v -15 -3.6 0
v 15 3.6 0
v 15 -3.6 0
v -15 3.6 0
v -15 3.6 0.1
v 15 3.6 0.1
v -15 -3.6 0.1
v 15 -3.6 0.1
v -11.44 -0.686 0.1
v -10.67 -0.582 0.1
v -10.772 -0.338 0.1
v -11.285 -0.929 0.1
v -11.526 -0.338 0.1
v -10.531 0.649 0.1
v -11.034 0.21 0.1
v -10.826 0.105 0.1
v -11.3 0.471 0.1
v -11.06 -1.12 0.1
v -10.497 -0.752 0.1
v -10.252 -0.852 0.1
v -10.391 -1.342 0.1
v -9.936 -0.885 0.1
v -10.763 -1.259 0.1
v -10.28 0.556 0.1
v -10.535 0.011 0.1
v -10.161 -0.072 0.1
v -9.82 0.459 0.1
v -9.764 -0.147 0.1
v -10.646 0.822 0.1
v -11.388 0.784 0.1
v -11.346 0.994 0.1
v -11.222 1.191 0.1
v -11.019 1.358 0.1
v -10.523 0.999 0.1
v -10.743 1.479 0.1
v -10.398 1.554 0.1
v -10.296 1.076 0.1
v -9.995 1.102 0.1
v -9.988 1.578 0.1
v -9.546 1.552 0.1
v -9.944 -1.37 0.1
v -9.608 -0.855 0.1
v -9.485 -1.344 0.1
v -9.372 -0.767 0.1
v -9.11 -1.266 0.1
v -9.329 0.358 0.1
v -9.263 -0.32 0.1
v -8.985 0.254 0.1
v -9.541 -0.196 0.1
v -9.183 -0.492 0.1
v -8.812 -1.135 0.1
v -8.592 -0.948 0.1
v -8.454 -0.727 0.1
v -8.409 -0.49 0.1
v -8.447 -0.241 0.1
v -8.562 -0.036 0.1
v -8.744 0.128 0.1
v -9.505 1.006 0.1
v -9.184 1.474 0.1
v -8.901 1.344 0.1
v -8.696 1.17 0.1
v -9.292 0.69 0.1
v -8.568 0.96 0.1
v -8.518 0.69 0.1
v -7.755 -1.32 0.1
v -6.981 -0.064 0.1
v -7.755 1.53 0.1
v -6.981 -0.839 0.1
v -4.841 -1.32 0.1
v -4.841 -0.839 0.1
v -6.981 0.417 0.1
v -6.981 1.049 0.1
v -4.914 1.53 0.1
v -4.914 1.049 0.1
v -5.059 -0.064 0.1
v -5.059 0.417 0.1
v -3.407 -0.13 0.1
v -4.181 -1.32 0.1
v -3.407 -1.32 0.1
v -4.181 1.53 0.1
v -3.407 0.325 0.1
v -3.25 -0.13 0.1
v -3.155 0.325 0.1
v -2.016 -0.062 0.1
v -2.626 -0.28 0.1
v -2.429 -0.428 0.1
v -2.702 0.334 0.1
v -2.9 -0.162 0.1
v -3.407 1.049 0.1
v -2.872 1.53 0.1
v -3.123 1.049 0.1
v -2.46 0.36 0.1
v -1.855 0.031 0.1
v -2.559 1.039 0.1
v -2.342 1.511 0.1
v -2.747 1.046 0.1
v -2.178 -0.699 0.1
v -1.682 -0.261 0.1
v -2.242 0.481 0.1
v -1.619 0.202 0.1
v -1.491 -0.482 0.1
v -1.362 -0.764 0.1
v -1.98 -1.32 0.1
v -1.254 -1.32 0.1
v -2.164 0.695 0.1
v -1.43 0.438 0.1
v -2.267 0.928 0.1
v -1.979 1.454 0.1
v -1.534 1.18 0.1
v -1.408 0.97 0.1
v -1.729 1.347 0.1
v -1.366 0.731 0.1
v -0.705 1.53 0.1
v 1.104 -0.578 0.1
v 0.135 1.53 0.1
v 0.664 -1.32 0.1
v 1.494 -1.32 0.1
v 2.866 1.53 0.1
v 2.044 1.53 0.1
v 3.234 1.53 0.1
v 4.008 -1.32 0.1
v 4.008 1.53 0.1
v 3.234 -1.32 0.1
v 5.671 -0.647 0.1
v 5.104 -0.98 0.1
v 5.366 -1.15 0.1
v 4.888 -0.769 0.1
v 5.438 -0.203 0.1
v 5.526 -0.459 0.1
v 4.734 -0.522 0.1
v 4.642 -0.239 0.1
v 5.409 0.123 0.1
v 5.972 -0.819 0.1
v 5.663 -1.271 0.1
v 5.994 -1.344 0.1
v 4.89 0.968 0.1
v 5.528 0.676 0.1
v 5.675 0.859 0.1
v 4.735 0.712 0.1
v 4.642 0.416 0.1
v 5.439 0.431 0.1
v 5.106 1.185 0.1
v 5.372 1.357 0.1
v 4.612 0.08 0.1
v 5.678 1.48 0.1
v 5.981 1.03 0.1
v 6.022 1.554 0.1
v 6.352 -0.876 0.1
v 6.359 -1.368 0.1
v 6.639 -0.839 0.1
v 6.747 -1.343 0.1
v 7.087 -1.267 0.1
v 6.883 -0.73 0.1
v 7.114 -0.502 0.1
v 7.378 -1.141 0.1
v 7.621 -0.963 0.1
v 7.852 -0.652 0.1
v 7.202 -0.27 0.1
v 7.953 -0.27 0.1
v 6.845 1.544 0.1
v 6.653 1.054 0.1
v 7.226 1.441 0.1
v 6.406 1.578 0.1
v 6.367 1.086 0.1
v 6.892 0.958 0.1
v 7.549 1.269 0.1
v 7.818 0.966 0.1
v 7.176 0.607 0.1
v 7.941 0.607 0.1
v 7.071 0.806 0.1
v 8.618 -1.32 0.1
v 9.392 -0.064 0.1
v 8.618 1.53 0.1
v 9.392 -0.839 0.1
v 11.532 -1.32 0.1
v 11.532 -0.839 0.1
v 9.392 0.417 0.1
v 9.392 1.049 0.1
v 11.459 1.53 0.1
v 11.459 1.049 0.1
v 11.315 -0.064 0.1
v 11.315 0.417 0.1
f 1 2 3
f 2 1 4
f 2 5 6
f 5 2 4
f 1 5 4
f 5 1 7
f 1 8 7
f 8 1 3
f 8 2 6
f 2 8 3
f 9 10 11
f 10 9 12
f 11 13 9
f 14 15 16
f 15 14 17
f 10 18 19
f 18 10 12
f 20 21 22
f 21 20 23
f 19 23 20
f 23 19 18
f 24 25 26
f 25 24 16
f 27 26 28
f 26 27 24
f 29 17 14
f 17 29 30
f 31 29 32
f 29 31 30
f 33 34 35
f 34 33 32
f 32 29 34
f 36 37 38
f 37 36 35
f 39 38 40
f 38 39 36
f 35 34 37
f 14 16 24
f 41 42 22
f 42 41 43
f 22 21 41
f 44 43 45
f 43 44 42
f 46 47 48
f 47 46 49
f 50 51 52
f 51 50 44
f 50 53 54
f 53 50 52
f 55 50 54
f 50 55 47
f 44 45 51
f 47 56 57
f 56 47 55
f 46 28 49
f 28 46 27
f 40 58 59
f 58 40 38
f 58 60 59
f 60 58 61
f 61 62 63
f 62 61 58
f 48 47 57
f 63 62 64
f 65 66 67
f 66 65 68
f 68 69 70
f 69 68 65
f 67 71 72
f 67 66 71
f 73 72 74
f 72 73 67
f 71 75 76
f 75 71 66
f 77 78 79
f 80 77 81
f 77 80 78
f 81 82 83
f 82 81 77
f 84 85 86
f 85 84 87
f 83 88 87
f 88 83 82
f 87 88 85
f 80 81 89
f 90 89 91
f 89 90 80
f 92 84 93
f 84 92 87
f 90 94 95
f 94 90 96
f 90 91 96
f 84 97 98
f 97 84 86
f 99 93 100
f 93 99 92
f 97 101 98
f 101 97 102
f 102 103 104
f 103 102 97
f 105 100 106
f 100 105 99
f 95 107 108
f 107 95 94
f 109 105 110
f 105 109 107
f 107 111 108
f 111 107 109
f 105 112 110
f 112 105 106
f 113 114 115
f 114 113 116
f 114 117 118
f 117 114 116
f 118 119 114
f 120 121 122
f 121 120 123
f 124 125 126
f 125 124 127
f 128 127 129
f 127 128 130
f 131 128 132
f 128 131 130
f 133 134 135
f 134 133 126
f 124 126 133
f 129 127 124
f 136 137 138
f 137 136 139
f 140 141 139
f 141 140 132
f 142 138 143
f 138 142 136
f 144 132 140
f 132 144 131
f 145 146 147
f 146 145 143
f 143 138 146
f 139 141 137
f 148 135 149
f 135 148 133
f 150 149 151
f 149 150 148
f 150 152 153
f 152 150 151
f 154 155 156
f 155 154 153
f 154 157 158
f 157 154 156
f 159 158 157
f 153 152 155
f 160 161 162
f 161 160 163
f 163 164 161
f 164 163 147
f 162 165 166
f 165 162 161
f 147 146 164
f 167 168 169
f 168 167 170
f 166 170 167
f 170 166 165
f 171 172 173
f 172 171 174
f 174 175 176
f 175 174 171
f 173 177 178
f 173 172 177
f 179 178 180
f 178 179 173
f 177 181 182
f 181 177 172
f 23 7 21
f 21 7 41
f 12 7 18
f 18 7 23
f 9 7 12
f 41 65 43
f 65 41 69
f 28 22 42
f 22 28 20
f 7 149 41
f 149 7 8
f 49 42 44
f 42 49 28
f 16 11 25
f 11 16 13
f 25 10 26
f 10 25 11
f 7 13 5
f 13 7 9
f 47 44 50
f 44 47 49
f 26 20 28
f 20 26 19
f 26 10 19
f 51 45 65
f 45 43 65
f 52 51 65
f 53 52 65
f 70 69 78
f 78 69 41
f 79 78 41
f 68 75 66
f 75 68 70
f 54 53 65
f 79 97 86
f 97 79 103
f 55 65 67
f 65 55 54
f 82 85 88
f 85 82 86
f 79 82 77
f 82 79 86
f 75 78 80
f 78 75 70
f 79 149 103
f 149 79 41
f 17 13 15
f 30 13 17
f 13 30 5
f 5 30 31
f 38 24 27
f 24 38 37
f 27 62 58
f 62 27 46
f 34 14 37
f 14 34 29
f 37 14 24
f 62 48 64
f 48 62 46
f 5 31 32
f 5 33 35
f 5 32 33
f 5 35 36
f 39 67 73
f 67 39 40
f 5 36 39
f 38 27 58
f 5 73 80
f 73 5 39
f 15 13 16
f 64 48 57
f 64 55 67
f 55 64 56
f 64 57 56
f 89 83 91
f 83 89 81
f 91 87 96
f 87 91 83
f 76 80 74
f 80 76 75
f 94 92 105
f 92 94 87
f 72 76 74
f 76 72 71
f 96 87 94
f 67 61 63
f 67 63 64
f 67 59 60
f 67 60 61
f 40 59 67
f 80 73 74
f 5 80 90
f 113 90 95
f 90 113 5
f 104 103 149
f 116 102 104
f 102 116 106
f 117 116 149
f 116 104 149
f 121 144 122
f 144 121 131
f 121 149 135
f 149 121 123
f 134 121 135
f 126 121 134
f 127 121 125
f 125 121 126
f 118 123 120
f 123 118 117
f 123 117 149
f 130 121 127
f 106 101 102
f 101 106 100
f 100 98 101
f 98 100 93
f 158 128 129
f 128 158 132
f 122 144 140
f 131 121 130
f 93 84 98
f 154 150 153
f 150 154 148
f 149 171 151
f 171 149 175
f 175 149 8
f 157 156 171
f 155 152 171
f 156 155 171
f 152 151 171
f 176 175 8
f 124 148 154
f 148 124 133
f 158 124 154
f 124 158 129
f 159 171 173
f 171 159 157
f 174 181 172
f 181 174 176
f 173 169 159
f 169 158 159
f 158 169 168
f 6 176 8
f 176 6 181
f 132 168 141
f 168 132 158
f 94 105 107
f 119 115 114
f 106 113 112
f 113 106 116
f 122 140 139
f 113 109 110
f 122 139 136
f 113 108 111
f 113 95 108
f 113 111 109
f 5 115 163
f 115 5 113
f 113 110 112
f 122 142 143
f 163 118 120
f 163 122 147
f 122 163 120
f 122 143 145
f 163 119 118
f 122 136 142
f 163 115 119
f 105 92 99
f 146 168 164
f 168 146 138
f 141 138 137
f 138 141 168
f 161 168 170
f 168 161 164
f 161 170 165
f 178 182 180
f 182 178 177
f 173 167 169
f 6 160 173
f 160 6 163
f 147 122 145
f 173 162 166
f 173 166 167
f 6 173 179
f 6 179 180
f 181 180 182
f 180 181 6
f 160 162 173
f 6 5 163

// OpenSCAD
// file: ../p/box5-12.scad
use <../lib.scad>
function ldraw_lib__box5_12() = [
// 0 Box with 5 Faces without Any Edges
// 0 Name: box5-12.dat
// 0 Author: Chris Dee [cwdee]
// 0 !LDRAW_ORG Primitive UPDATE 2009-02
// 0 !LICENSE Licensed under CC BY 2.0 and CC BY 4.0 : see CAreadme.txt
// 
// 0 BFC CERTIFY CCW
  [0,"BFC","CERTIFY"],
  [0,"BFC","CCW"],
// 
// 0 !HISTORY 2009-09-03 [PTadmin] Official Update 2009-02
// 
// 
// 4 16 1 1 1 1 1 -1 -1 1 -1 -1 1 1
  [4,16,1,1,1,1,1,-1,-1,1,-1,-1,1,1],
// 4 16 -1 0 1 1 0 1 1 1 1 -1 1 1
  [4,16,-1,0,1,1,0,1,1,1,1,-1,1,1],
// 4 16 -1 0 -1 -1 0 1 -1 1 1 -1 1 -1
  [4,16,-1,0,-1,-1,0,1,-1,1,1,-1,1,-1],
// 4 16 1 0 -1 -1 0 -1 -1 1 -1 1 1 -1
  [4,16,1,0,-1,-1,0,-1,-1,1,-1,1,1,-1],
// 4 16 1 0 1 1 0 -1 1 1 -1 1 1 1
  [4,16,1,0,1,1,0,-1,1,1,-1,1,1,1],
// 0
];
module ldraw_lib__box5_12(step=0, col=false, unit=2/5, alt=false, line=0.2, solid=!$preview)
    makepoly(ldraw_lib__box5_12(), step=step, col=col, unit=unit, alt=alt, line=line, solid=solid);
ldraw_lib__box5_12(line=0.2);
// main file
use <../lib.scad>
use <../p/box5-12.scad>
function ldraw_lib__190435b() = [
// 0 Sticker  0.9 x  3.7 with "SERVICE"
// 0 Name: 190435b.dat
// 0 Author: J.C. Tchang [tchang]
// 0 !LDRAW_ORG Part UPDATE 2013-02
// 0 !LICENSE Licensed under CC BY 2.0 and CC BY 4.0 : see CAreadme.txt
// 
// 0 BFC CERTIFY CCW
  [0,"BFC","CERTIFY"],
  [0,"BFC","CCW"],
// 
// 0 !KEYWORDS set 646
// 
// 0 !HISTORY 2013-12-23 [PTadmin] Official Update 2013-02
// 
// 
// 1 16 0 -0.25 0 37.5 0 0 0 0.25 0 0 0 9 box5-12.dat
  [1,16,0,-0.25,0,37.5,0,0,0,0.25,0,0,0,9, ldraw_lib__box5_12()],
// 0 //
// 4 15 -26.674 -0.25 -1.456 -26.931 -0.25 -0.844 -28.601 -0.25 -1.715 -28.213 -0.25 -2.322
  [4,15,-26.674,-0.25,-1.456,-26.931,-0.25,-0.844,-28.601,-0.25,-1.715,-28.213,-0.25,-2.322],
// 3 15 -26.931 -0.25 -0.844 -28.815 -0.25 -0.844 -28.601 -0.25 -1.715
  [3,15,-26.931,-0.25,-0.844,-28.815,-0.25,-0.844,-28.601,-0.25,-1.715],
// 4 15 -27.586 -0.25 0.525 -27.064 -0.25 0.262 -26.327 -0.25 1.623 -28.249 -0.25 1.178
  [4,15,-27.586,-0.25,0.525,-27.064,-0.25,0.262,-26.327,-0.25,1.623,-28.249,-0.25,1.178],
// 4 15 -28.213 -0.25 -2.322 -27.651 -0.25 -2.801 -26.242 -0.25 -1.881 -26.674 -0.25 -1.456
  [4,15,-28.213,-0.25,-2.322,-27.651,-0.25,-2.801,-26.242,-0.25,-1.881,-26.674,-0.25,-1.456],
// 4 15 -25.631 -0.25 -2.129 -26.908 -0.25 -3.148 -25.977 -0.25 -3.356 -24.839 -0.25 -2.212
  [4,15,-25.631,-0.25,-2.129,-26.908,-0.25,-3.148,-25.977,-0.25,-3.356,-24.839,-0.25,-2.212],
// 4 15 -26.908 -0.25 -3.148 -25.631 -0.25 -2.129 -26.242 -0.25 -1.881 -27.651 -0.25 -2.801
  [4,15,-26.908,-0.25,-3.148,-25.631,-0.25,-2.129,-26.242,-0.25,-1.881,-27.651,-0.25,-2.801],
// 4 15 -25.7 -0.25 1.39 -27.064 -0.25 0.262 -26.337 -0.25 0.027 -25.402 -0.25 -0.179
  [4,15,-25.7,-0.25,1.39,-27.064,-0.25,0.262,-26.337,-0.25,0.027,-25.402,-0.25,-0.179],
// 4 15 -24.55 -0.25 1.147 -25.7 -0.25 1.39 -25.402 -0.25 -0.179 -24.41 -0.25 -0.368
  [4,15,-24.55,-0.25,1.147,-25.7,-0.25,1.39,-25.402,-0.25,-0.179,-24.41,-0.25,-0.368],
// 4 15 -26.615 -0.25 2.055 -28.469 -0.25 1.959 -28.249 -0.25 1.178 -26.327 -0.25 1.623
  [4,15,-26.615,-0.25,2.055,-28.469,-0.25,1.959,-28.249,-0.25,1.178,-26.327,-0.25,1.623],
// 4 15 -28.365 -0.25 2.485 -28.469 -0.25 1.959 -26.615 -0.25 2.055 -28.054 -0.25 2.977
  [4,15,-28.365,-0.25,2.485,-28.469,-0.25,1.959,-26.615,-0.25,2.055,-28.054,-0.25,2.977],
// 4 15 -27.547 -0.25 3.394 -28.054 -0.25 2.977 -26.308 -0.25 2.497 -26.857 -0.25 3.698
  [4,15,-27.547,-0.25,3.394,-28.054,-0.25,2.977,-26.308,-0.25,2.497,-26.857,-0.25,3.698],
// 3 15 -28.054 -0.25 2.977 -26.615 -0.25 2.055 -26.308 -0.25 2.497
  [3,15,-28.054,-0.25,2.977,-26.615,-0.25,2.055,-26.308,-0.25,2.497],
// 4 15 -25.739 -0.25 2.69 -24.987 -0.25 2.754 -25.994 -0.25 3.884 -26.857 -0.25 3.698
  [4,15,-25.739,-0.25,2.69,-24.987,-0.25,2.754,-25.994,-0.25,3.884,-26.857,-0.25,3.698],
// 4 15 -24.97 -0.25 3.946 -25.994 -0.25 3.884 -24.987 -0.25 2.754 -23.865 -0.25 3.881
  [4,15,-24.97,-0.25,3.946,-25.994,-0.25,3.884,-24.987,-0.25,2.754,-23.865,-0.25,3.881],
// 3 15 -26.857 -0.25 3.698 -26.308 -0.25 2.497 -25.739 -0.25 2.69
  [3,15,-26.857,-0.25,3.698,-26.308,-0.25,2.497,-25.739,-0.25,2.69],
// 3 15 -26.327 -0.25 1.623 -27.064 -0.25 0.262 -25.7 -0.25 1.39
  [3,15,-26.327,-0.25,1.623,-27.064,-0.25,0.262,-25.7,-0.25,1.39],
// 4 15 -24.839 -0.25 -2.212 -24.859 -0.25 -3.426 -23.713 -0.25 -3.361 -24.02 -0.25 -2.138
  [4,15,-24.839,-0.25,-2.212,-24.859,-0.25,-3.426,-23.713,-0.25,-3.361,-24.02,-0.25,-2.138],
// 3 15 -24.839 -0.25 -2.212 -25.977 -0.25 -3.356 -24.859 -0.25 -3.426
  [3,15,-24.839,-0.25,-2.212,-25.977,-0.25,-3.356,-24.859,-0.25,-3.426],
// 4 15 -22.774 -0.25 -3.166 -23.431 -0.25 -1.917 -24.02 -0.25 -2.138 -23.713 -0.25 -3.361
  [4,15,-22.774,-0.25,-3.166,-23.431,-0.25,-1.917,-24.02,-0.25,-2.138,-23.713,-0.25,-3.361],
// 4 15 -23.853 -0.25 -0.49 -23.157 -0.25 -0.799 -22.462 -0.25 0.635 -23.322 -0.25 0.895
  [4,15,-23.853,-0.25,-0.49,-23.157,-0.25,-0.799,-22.462,-0.25,0.635,-23.322,-0.25,0.895],
// 4 15 -23.431 -0.25 -1.917 -22.031 -0.25 -2.837 -21.479 -0.25 -2.371 -22.957 -0.25 -1.229
  [4,15,-23.431,-0.25,-1.917,-22.031,-0.25,-2.837,-21.479,-0.25,-2.371,-22.957,-0.25,-1.229],
// 4 15 -21.136 -0.25 -1.817 -21.022 -0.25 -1.224 -22.957 -0.25 -1.229 -21.479 -0.25 -2.371
  [4,15,-21.136,-0.25,-1.817,-21.022,-0.25,-1.224,-22.957,-0.25,-1.229,-21.479,-0.25,-2.371],
// 4 15 -22.957 -0.25 -1.229 -21.022 -0.25 -1.224 -21.117 -0.25 -0.603 -23.157 -0.25 -0.799
  [4,15,-22.957,-0.25,-1.229,-21.022,-0.25,-1.224,-21.117,-0.25,-0.603,-23.157,-0.25,-0.799],
// 3 15 -23.431 -0.25 -1.917 -22.774 -0.25 -3.166 -22.031 -0.25 -2.837
  [3,15,-23.431,-0.25,-1.917,-22.774,-0.25,-3.166,-22.031,-0.25,-2.837],
// 4 15 -23.157 -0.25 -0.799 -21.117 -0.25 -0.603 -21.404 -0.25 -0.089 -21.859 -0.25 0.321
  [4,15,-23.157,-0.25,-0.799,-21.117,-0.25,-0.603,-21.404,-0.25,-0.089,-21.859,-0.25,0.321],
// 4 15 -23.322 -0.25 0.895 -24.55 -0.25 1.147 -24.41 -0.25 -0.368 -23.853 -0.25 -0.49
  [4,15,-23.322,-0.25,0.895,-24.55,-0.25,1.147,-24.41,-0.25,-0.368,-23.853,-0.25,-0.49],
// 4 15 -23.762 -0.25 2.514 -22.959 -0.25 3.685 -23.865 -0.25 3.881 -24.987 -0.25 2.754
  [4,15,-23.762,-0.25,2.514,-22.959,-0.25,3.685,-23.865,-0.25,3.881,-24.987,-0.25,2.754],
// 4 15 -22.252 -0.25 3.359 -22.959 -0.25 3.685 -23.762 -0.25 2.514 -21.74 -0.25 2.924
  [4,15,-22.252,-0.25,3.359,-22.959,-0.25,3.685,-23.762,-0.25,2.514,-21.74,-0.25,2.924],
// 4 15 -21.74 -0.25 2.924 -23.762 -0.25 2.514 -23.229 -0.25 1.726 -21.42 -0.25 2.401
  [4,15,-21.74,-0.25,2.924,-23.762,-0.25,2.514,-23.229,-0.25,1.726,-21.42,-0.25,2.401],
// 3 15 -22.462 -0.25 0.635 -23.157 -0.25 -0.799 -21.859 -0.25 0.321
  [3,15,-22.462,-0.25,0.635,-23.157,-0.25,-0.799,-21.859,-0.25,0.321],
// 3 15 -21.42 -0.25 2.401 -23.229 -0.25 1.726 -21.294 -0.25 1.726
  [3,15,-21.42,-0.25,2.401,-23.229,-0.25,1.726,-21.294,-0.25,1.726],
// 4 15 -19.388 -0.25 -3.3 -17.452 -0.25 -2.097 -17.452 -0.25 -0.161 -19.388 -0.25 3.826
  [4,15,-19.388,-0.25,-3.3,-17.452,-0.25,-2.097,-17.452,-0.25,-0.161,-19.388,-0.25,3.826],
// 4 15 -17.452 -0.25 -2.097 -19.388 -0.25 -3.3 -12.102 -0.25 -3.3 -12.102 -0.25 -2.097
  [4,15,-17.452,-0.25,-2.097,-19.388,-0.25,-3.3,-12.102,-0.25,-3.3,-12.102,-0.25,-2.097],
// 3 15 -19.388 -0.25 3.826 -17.452 -0.25 1.042 -17.452 -0.25 2.623
  [3,15,-19.388,-0.25,3.826,-17.452,-0.25,1.042,-17.452,-0.25,2.623],
// 3 15 -19.388 -0.25 3.826 -17.452 -0.25 -0.161 -17.452 -0.25 1.042
  [3,15,-19.388,-0.25,3.826,-17.452,-0.25,-0.161,-17.452,-0.25,1.042],
// 4 15 -12.286 -0.25 3.826 -19.388 -0.25 3.826 -17.452 -0.25 2.623 -12.286 -0.25 2.623
  [4,15,-12.286,-0.25,3.826,-19.388,-0.25,3.826,-17.452,-0.25,2.623,-12.286,-0.25,2.623],
// 4 15 -17.452 -0.25 1.042 -17.452 -0.25 -0.161 -12.647 -0.25 -0.161 -12.647 -0.25 1.042
  [4,15,-17.452,-0.25,1.042,-17.452,-0.25,-0.161,-12.647,-0.25,-0.161,-12.647,-0.25,1.042],
// 3 15 -8.518 -0.25 -0.325 -10.453 -0.25 -3.3 -8.518 -0.25 -3.3
  [3,15,-8.518,-0.25,-0.325,-10.453,-0.25,-3.3,-8.518,-0.25,-3.3],
// 4 15 -10.453 -0.25 -3.3 -8.518 -0.25 -0.325 -8.518 -0.25 0.812 -10.453 -0.25 3.826
  [4,15,-10.453,-0.25,-3.3,-8.518,-0.25,-0.325,-8.518,-0.25,0.812,-10.453,-0.25,3.826],
// 4 15 -8.518 -0.25 0.812 -8.518 -0.25 -0.325 -8.125 -0.25 -0.325 -7.887 -0.25 0.812
  [4,15,-8.518,-0.25,0.812,-8.518,-0.25,-0.325,-8.125,-0.25,-0.325,-7.887,-0.25,0.812],
// 4 15 -6.566 -0.25 -0.701 -6.073 -0.25 -1.071 -5.04 -0.25 -0.155 -6.756 -0.25 0.835
  [4,15,-6.566,-0.25,-0.701,-6.073,-0.25,-1.071,-5.04,-0.25,-0.155,-6.756,-0.25,0.835],
// 4 15 -7.887 -0.25 0.812 -8.125 -0.25 -0.325 -7.249 -0.25 -0.405 -6.756 -0.25 0.835
  [4,15,-7.887,-0.25,0.812,-8.125,-0.25,-0.325,-7.249,-0.25,-0.405,-6.756,-0.25,0.835],
// 3 15 -6.756 -0.25 0.835 -7.249 -0.25 -0.405 -6.566 -0.25 -0.701
  [3,15,-6.756,-0.25,0.835,-7.249,-0.25,-0.405,-6.566,-0.25,-0.701],
// 3 15 -10.453 -0.25 3.826 -8.518 -0.25 0.812 -8.518 -0.25 2.623
  [3,15,-10.453,-0.25,3.826,-8.518,-0.25,0.812,-8.518,-0.25,2.623],
// 4 15 -8.518 -0.25 2.623 -7.808 -0.25 2.623 -7.181 -0.25 3.826 -10.453 -0.25 3.826
  [4,15,-8.518,-0.25,2.623,-7.808,-0.25,2.623,-7.181,-0.25,3.826,-10.453,-0.25,3.826],
// 4 15 -6.149 -0.25 0.9 -6.756 -0.25 0.835 -5.04 -0.25 -0.155 -4.638 -0.25 0.078
  [4,15,-6.149,-0.25,0.9,-6.756,-0.25,0.835,-5.04,-0.25,-0.155,-4.638,-0.25,0.078],
// 4 15 -7.181 -0.25 3.826 -6.867 -0.25 2.616 -6.397 -0.25 2.598 -5.855 -0.25 3.778
  [4,15,-7.181,-0.25,3.826,-6.867,-0.25,2.616,-6.397,-0.25,2.598,-5.855,-0.25,3.778],
// 3 15 -7.181 -0.25 3.826 -7.808 -0.25 2.623 -6.867 -0.25 2.616
  [3,15,-7.181,-0.25,3.826,-7.808,-0.25,2.623,-6.867,-0.25,2.616],
// 4 15 -6.073 -0.25 -1.071 -5.444 -0.25 -1.747 -4.206 -0.25 -0.653 -5.04 -0.25 -0.155
  [4,15,-6.073,-0.25,-1.071,-5.444,-0.25,-1.747,-4.206,-0.25,-0.653,-5.04,-0.25,-0.155],
// 4 15 -5.606 -0.25 1.202 -6.149 -0.25 0.9 -4.638 -0.25 0.078 -4.048 -0.25 0.504
  [4,15,-5.606,-0.25,1.202,-6.149,-0.25,0.9,-4.638,-0.25,0.078,-4.048,-0.25,0.504],
// 4 15 -3.727 -0.25 -1.205 -4.206 -0.25 -0.653 -5.444 -0.25 -1.747 -3.406 -0.25 -1.91
  [4,15,-3.727,-0.25,-1.205,-4.206,-0.25,-0.653,-5.444,-0.25,-1.747,-3.406,-0.25,-1.91],
// 4 15 -3.406 -0.25 -1.91 -5.444 -0.25 -1.747 -4.951 -0.25 -3.3 -3.135 -0.25 -3.3
  [4,15,-3.406,-0.25,-1.91,-5.444,-0.25,-1.747,-4.951,-0.25,-3.3,-3.135,-0.25,-3.3],
// 4 15 -5.606 -0.25 1.202 -4.048 -0.25 0.504 -3.574 -0.25 1.096 -5.41 -0.25 1.737
  [4,15,-5.606,-0.25,1.202,-4.048,-0.25,0.504,-3.574,-0.25,1.096,-5.41,-0.25,1.737],
// 4 15 -5.668 -0.25 2.319 -4.948 -0.25 3.634 -5.855 -0.25 3.778 -6.397 -0.25 2.598
  [4,15,-5.668,-0.25,2.319,-4.948,-0.25,3.634,-5.855,-0.25,3.778,-6.397,-0.25,2.598],
// 4 15 -5.668 -0.25 2.319 -5.41 -0.25 1.737 -3.52 -0.25 2.425 -3.834 -0.25 2.951
  [4,15,-5.668,-0.25,2.319,-5.41,-0.25,1.737,-3.52,-0.25,2.425,-3.834,-0.25,2.951],
// 4 15 -4.322 -0.25 3.367 -4.948 -0.25 3.634 -5.668 -0.25 2.319 -3.834 -0.25 2.951
  [4,15,-4.322,-0.25,3.367,-4.948,-0.25,3.634,-5.668,-0.25,2.319,-3.834,-0.25,2.951],
// 4 15 -3.416 -0.25 1.828 -3.52 -0.25 2.425 -5.41 -0.25 1.737 -3.574 -0.25 1.096
  [4,15,-3.416,-0.25,1.828,-3.52,-0.25,2.425,-5.41,-0.25,1.737,-3.574,-0.25,1.096],
// 4 15 2.76 -0.25 -1.446 0.337 -0.25 3.826 -1.762 -0.25 3.826 1.661 -0.25 -3.3
  [4,15,2.76,-0.25,-1.446,0.337,-0.25,3.826,-1.762,-0.25,3.826,1.661,-0.25,-3.3],
// 4 15 3.734 -0.25 -3.3 7.165 -0.25 3.826 2.76 -0.25 -1.446 1.661 -0.25 -3.3
  [4,15,3.734,-0.25,-3.3,7.165,-0.25,3.826,2.76,-0.25,-1.446,1.661,-0.25,-3.3],
// 3 15 7.165 -0.25 3.826 5.109 -0.25 3.826 2.76 -0.25 -1.446
  [3,15,7.165,-0.25,3.826,5.109,-0.25,3.826,2.76,-0.25,-1.446],
// 4 15 8.085 -0.25 3.826 8.085 -0.25 -3.3 10.021 -0.25 -3.3 10.021 -0.25 3.826
  [4,15,8.085,-0.25,3.826,8.085,-0.25,-3.3,10.021,-0.25,-3.3,10.021,-0.25,3.826],
// 4 15 14.178 -0.25 -1.617 12.221 -0.25 -1.922 12.759 -0.25 -2.451 13.416 -0.25 -2.875
  [4,15,14.178,-0.25,-1.617,12.221,-0.25,-1.922,12.759,-0.25,-2.451,13.416,-0.25,-2.875],
// 4 15 11.836 -0.25 -1.304 12.221 -0.25 -1.922 13.814 -0.25 -1.148 13.596 -0.25 -0.507
  [4,15,11.836,-0.25,-1.304,12.221,-0.25,-1.922,13.814,-0.25,-1.148,13.596,-0.25,-0.507],
// 4 15 11.606 -0.25 -0.597 11.836 -0.25 -1.304 13.596 -0.25 -0.507 13.523 -0.25 0.307
  [4,15,11.606,-0.25,-0.597,11.836,-0.25,-1.304,13.596,-0.25,-0.507,13.523,-0.25,0.307],
// 4 15 14.158 -0.25 -3.178 14.986 -0.25 -3.36 14.93 -0.25 -2.047 13.416 -0.25 -2.875
  [4,15,14.158,-0.25,-3.178,14.986,-0.25,-3.36,14.93,-0.25,-2.047,13.416,-0.25,-2.875],
// 3 15 14.178 -0.25 -1.617 13.416 -0.25 -2.875 14.93 -0.25 -2.047
  [3,15,14.178,-0.25,-1.617,13.416,-0.25,-2.875,14.93,-0.25,-2.047],
// 3 15 13.814 -0.25 -1.148 12.221 -0.25 -1.922 14.178 -0.25 -1.617
  [3,15,13.814,-0.25,-1.148,12.221,-0.25,-1.922,14.178,-0.25,-1.617],
// 4 15 12.224 -0.25 2.42 11.838 -0.25 1.78 13.819 -0.25 1.69 14.188 -0.25 2.147
  [4,15,12.224,-0.25,2.42,11.838,-0.25,1.78,13.819,-0.25,1.69,14.188,-0.25,2.147],
// 4 15 13.597 -0.25 1.077 11.838 -0.25 1.78 11.606 -0.25 1.039 13.523 -0.25 0.307
  [4,15,13.597,-0.25,1.077,11.838,-0.25,1.78,11.606,-0.25,1.039,13.523,-0.25,0.307],
// 4 15 14.188 -0.25 2.147 13.431 -0.25 3.393 12.765 -0.25 2.962 12.224 -0.25 2.42
  [4,15,14.188,-0.25,2.147,13.431,-0.25,3.393,12.765,-0.25,2.962,12.224,-0.25,2.42],
// 4 15 13.523 -0.25 0.307 11.606 -0.25 1.039 11.529 -0.25 0.2 11.606 -0.25 -0.597
  [4,15,13.523,-0.25,0.307,11.606,-0.25,1.039,11.529,-0.25,0.2,11.606,-0.25,-0.597],
// 4 15 14.195 -0.25 3.7 13.431 -0.25 3.393 14.952 -0.25 2.574 15.056 -0.25 3.884
  [4,15,14.195,-0.25,3.7,13.431,-0.25,3.393,14.952,-0.25,2.574,15.056,-0.25,3.884],
// 3 15 13.431 -0.25 3.393 14.188 -0.25 2.147 14.952 -0.25 2.574
  [3,15,13.431,-0.25,3.393,14.188,-0.25,2.147,14.952,-0.25,2.574],
// 3 15 11.838 -0.25 1.78 13.597 -0.25 1.077 13.819 -0.25 1.69
  [3,15,11.838,-0.25,1.78,13.597,-0.25,1.077,13.819,-0.25,1.69],
// 4 15 15.879 -0.25 -2.19 14.93 -0.25 -2.047 14.986 -0.25 -3.36 15.898 -0.25 -3.42
  [4,15,15.879,-0.25,-2.19,14.93,-0.25,-2.047,14.986,-0.25,-3.36,15.898,-0.25,-3.42],
// 4 15 15.879 -0.25 -2.19 15.898 -0.25 -3.42 16.868 -0.25 -3.357 16.597 -0.25 -2.098
  [4,15,15.879,-0.25,-2.19,15.898,-0.25,-3.42,16.868,-0.25,-3.357,16.597,-0.25,-2.098],
// 4 15 17.717 -0.25 -3.168 17.207 -0.25 -1.824 16.597 -0.25 -2.098 16.868 -0.25 -3.357
  [4,15,17.717,-0.25,-3.168,17.207,-0.25,-1.824,16.597,-0.25,-2.098,16.868,-0.25,-3.357],
// 4 15 19.052 -0.25 -2.408 17.785 -0.25 -1.255 17.207 -0.25 -1.824 18.446 -0.25 -2.853
  [4,15,19.052,-0.25,-2.408,17.785,-0.25,-1.255,17.207,-0.25,-1.824,18.446,-0.25,-2.853],
// 4 15 17.785 -0.25 -1.255 19.052 -0.25 -2.408 19.631 -0.25 -1.63 18.006 -0.25 -0.675
  [4,15,17.785,-0.25,-1.255,19.052,-0.25,-2.408,19.631,-0.25,-1.63,18.006,-0.25,-0.675],
// 3 15 19.882 -0.25 -0.675 18.006 -0.25 -0.675 19.631 -0.25 -1.63
  [3,15,19.882,-0.25,-0.675,18.006,-0.25,-0.675,19.631,-0.25,-1.63],
// 3 15 17.207 -0.25 -1.824 17.717 -0.25 -3.168 18.446 -0.25 -2.853
  [3,15,17.207,-0.25,-1.824,17.717,-0.25,-3.168,18.446,-0.25,-2.853],
// 4 15 16.632 -0.25 2.635 18.066 -0.25 3.602 17.113 -0.25 3.86 16.015 -0.25 3.946
  [4,15,16.632,-0.25,2.635,18.066,-0.25,3.602,17.113,-0.25,3.86,16.015,-0.25,3.946],
// 4 15 15.918 -0.25 2.716 16.632 -0.25 2.635 16.015 -0.25 3.946 15.056 -0.25 3.884
  [4,15,15.918,-0.25,2.716,16.632,-0.25,2.635,16.015,-0.25,3.946,15.056,-0.25,3.884],
// 4 15 18.066 -0.25 3.602 16.632 -0.25 2.635 17.229 -0.25 2.394 18.872 -0.25 3.172
  [4,15,18.066,-0.25,3.602,16.632,-0.25,2.635,17.229,-0.25,2.394,18.872,-0.25,3.172],
// 3 15 15.056 -0.25 3.884 14.952 -0.25 2.574 15.918 -0.25 2.716
  [3,15,15.056,-0.25,3.884,14.952,-0.25,2.574,15.918,-0.25,2.716],
// 4 15 19.544 -0.25 2.414 17.677 -0.25 2.014 17.939 -0.25 1.518 19.853 -0.25 1.518
  [4,15,19.544,-0.25,2.414,17.677,-0.25,2.014,17.939,-0.25,1.518,19.853,-0.25,1.518],
// 4 15 17.677 -0.25 2.014 19.544 -0.25 2.414 18.872 -0.25 3.172 17.229 -0.25 2.394
  [4,15,17.677,-0.25,2.014,19.544,-0.25,2.414,18.872,-0.25,3.172,17.229,-0.25,2.394],
// 4 15 21.545 -0.25 -3.3 23.481 -0.25 -2.097 23.481 -0.25 -0.161 21.545 -0.25 3.826
  [4,15,21.545,-0.25,-3.3,23.481,-0.25,-2.097,23.481,-0.25,-0.161,21.545,-0.25,3.826],
// 4 15 23.481 -0.25 -2.097 21.545 -0.25 -3.3 28.831 -0.25 -3.3 28.831 -0.25 -2.097
  [4,15,23.481,-0.25,-2.097,21.545,-0.25,-3.3,28.831,-0.25,-3.3,28.831,-0.25,-2.097],
// 3 15 21.545 -0.25 3.826 23.481 -0.25 1.042 23.481 -0.25 2.623
  [3,15,21.545,-0.25,3.826,23.481,-0.25,1.042,23.481,-0.25,2.623],
// 3 15 21.545 -0.25 3.826 23.481 -0.25 -0.161 23.481 -0.25 1.042
  [3,15,21.545,-0.25,3.826,23.481,-0.25,-0.161,23.481,-0.25,1.042],
// 4 15 28.647 -0.25 3.826 21.545 -0.25 3.826 23.481 -0.25 2.623 28.647 -0.25 2.623
  [4,15,28.647,-0.25,3.826,21.545,-0.25,3.826,23.481,-0.25,2.623,28.647,-0.25,2.623],
// 4 15 23.481 -0.25 1.042 23.481 -0.25 -0.161 28.287 -0.25 -0.161 28.287 -0.25 1.042
  [4,15,23.481,-0.25,1.042,23.481,-0.25,-0.161,28.287,-0.25,-0.161,28.287,-0.25,1.042],
// 0 //
// 3 4 -26.908 -0.25 -3.148 -37.5 -0.25 -9 -25.977 -0.25 -3.356
  [3,4,-26.908,-0.25,-3.148,-37.5,-0.25,-9,-25.977,-0.25,-3.356],
// 3 4 -25.977 -0.25 -3.356 -37.5 -0.25 -9 -24.859 -0.25 -3.426
  [3,4,-25.977,-0.25,-3.356,-37.5,-0.25,-9,-24.859,-0.25,-3.426],
// 3 4 -28.213 -0.25 -2.322 -37.5 -0.25 -9 -27.651 -0.25 -2.801
  [3,4,-28.213,-0.25,-2.322,-37.5,-0.25,-9,-27.651,-0.25,-2.801],
// 3 4 -27.651 -0.25 -2.801 -37.5 -0.25 -9 -26.908 -0.25 -3.148
  [3,4,-27.651,-0.25,-2.801,-37.5,-0.25,-9,-26.908,-0.25,-3.148],
// 3 4 -28.601 -0.25 -1.715 -37.5 -0.25 -9 -28.213 -0.25 -2.322
  [3,4,-28.601,-0.25,-1.715,-37.5,-0.25,-9,-28.213,-0.25,-2.322],
// 4 4 -19.388 -0.25 -3.3 -23.713 -0.25 -3.361 -24.859 -0.25 -3.426 -12.102 -0.25 -3.3
  [4,4,-19.388,-0.25,-3.3,-23.713,-0.25,-3.361,-24.859,-0.25,-3.426,-12.102,-0.25,-3.3],
// 4 4 -24.41 -0.25 -0.368 -25.631 -0.25 -2.129 -24.839 -0.25 -2.212 -24.02 -0.25 -2.138
  [4,4,-24.41,-0.25,-0.368,-25.631,-0.25,-2.129,-24.839,-0.25,-2.212,-24.02,-0.25,-2.138],
// 4 4 15.898 -0.25 -3.42 -24.859 -0.25 -3.426 -37.5 -0.25 -9 37.5 -0.25 -9
  [4,4,15.898,-0.25,-3.42,-24.859,-0.25,-3.426,-37.5,-0.25,-9,37.5,-0.25,-9],
// 4 4 -24.02 -0.25 -2.138 -23.431 -0.25 -1.917 -23.853 -0.25 -0.49 -24.41 -0.25 -0.368
  [4,4,-24.02,-0.25,-2.138,-23.431,-0.25,-1.917,-23.853,-0.25,-0.49,-24.41,-0.25,-0.368],
// 4 4 -27.064 -0.25 0.262 -28.815 -0.25 -0.844 -26.931 -0.25 -0.844 -26.337 -0.25 0.027
  [4,4,-27.064,-0.25,0.262,-28.815,-0.25,-0.844,-26.931,-0.25,-0.844,-26.337,-0.25,0.027],
// 4 4 -25.402 -0.25 -0.179 -26.337 -0.25 0.027 -26.931 -0.25 -0.844 -26.674 -0.25 -1.456
  [4,4,-25.402,-0.25,-0.179,-26.337,-0.25,0.027,-26.931,-0.25,-0.844,-26.674,-0.25,-1.456],
// 4 4 -28.815 -0.25 -0.844 -37.5 -0.25 9 -37.5 -0.25 -9 -28.601 -0.25 -1.715
  [4,4,-28.815,-0.25,-0.844,-37.5,-0.25,9,-37.5,-0.25,-9,-28.601,-0.25,-1.715],
// 4 4 -23.853 -0.25 -0.49 -23.431 -0.25 -1.917 -22.957 -0.25 -1.229 -23.157 -0.25 -0.799
  [4,4,-23.853,-0.25,-0.49,-23.431,-0.25,-1.917,-22.957,-0.25,-1.229,-23.157,-0.25,-0.799],
// 4 4 -25.402 -0.25 -0.179 -26.242 -0.25 -1.881 -25.631 -0.25 -2.129 -24.41 -0.25 -0.368
  [4,4,-25.402,-0.25,-0.179,-26.242,-0.25,-1.881,-25.631,-0.25,-2.129,-24.41,-0.25,-0.368],
// 3 4 -25.402 -0.25 -0.179 -26.674 -0.25 -1.456 -26.242 -0.25 -1.881
  [3,4,-25.402,-0.25,-0.179,-26.674,-0.25,-1.456,-26.242,-0.25,-1.881],
// 3 4 -22.031 -0.25 -2.837 -22.774 -0.25 -3.166 -19.388 -0.25 -3.3
  [3,4,-22.031,-0.25,-2.837,-22.774,-0.25,-3.166,-19.388,-0.25,-3.3],
// 3 4 -22.774 -0.25 -3.166 -23.713 -0.25 -3.361 -19.388 -0.25 -3.3
  [3,4,-22.774,-0.25,-3.166,-23.713,-0.25,-3.361,-19.388,-0.25,-3.3],
// 3 4 -21.479 -0.25 -2.371 -22.031 -0.25 -2.837 -19.388 -0.25 -3.3
  [3,4,-21.479,-0.25,-2.371,-22.031,-0.25,-2.837,-19.388,-0.25,-3.3],
// 3 4 -21.136 -0.25 -1.817 -21.479 -0.25 -2.371 -19.388 -0.25 -3.3
  [3,4,-21.136,-0.25,-1.817,-21.479,-0.25,-2.371,-19.388,-0.25,-3.3],
// 3 4 -12.102 -0.25 -2.097 -12.102 -0.25 -3.3 -10.453 -0.25 -3.3
  [3,4,-12.102,-0.25,-2.097,-12.102,-0.25,-3.3,-10.453,-0.25,-3.3],
// 3 4 -10.453 -0.25 -3.3 -12.102 -0.25 -3.3 -24.859 -0.25 -3.426
  [3,4,-10.453,-0.25,-3.3,-12.102,-0.25,-3.3,-24.859,-0.25,-3.426],
// 3 4 -8.518 -0.25 -3.3 -10.453 -0.25 -3.3 -24.859 -0.25 -3.426
  [3,4,-8.518,-0.25,-3.3,-10.453,-0.25,-3.3,-24.859,-0.25,-3.426],
// 4 4 -17.452 -0.25 -2.097 -12.102 -0.25 -2.097 -12.647 -0.25 -0.161 -17.452 -0.25 -0.161
  [4,4,-17.452,-0.25,-2.097,-12.102,-0.25,-2.097,-12.647,-0.25,-0.161,-17.452,-0.25,-0.161],
// 3 4 -21.022 -0.25 -1.224 -21.136 -0.25 -1.817 -19.388 -0.25 -3.3
  [3,4,-21.022,-0.25,-1.224,-21.136,-0.25,-1.817,-19.388,-0.25,-3.3],
// 4 4 -8.518 -0.25 -3.3 -4.951 -0.25 -3.3 -5.444 -0.25 -1.747 -6.073 -0.25 -1.071
  [4,4,-8.518,-0.25,-3.3,-4.951,-0.25,-3.3,-5.444,-0.25,-1.747,-6.073,-0.25,-1.071],
// 4 4 -21.117 -0.25 -0.603 -21.022 -0.25 -1.224 -19.388 -0.25 -3.3 -19.388 -0.25 3.826
  [4,4,-21.117,-0.25,-0.603,-21.022,-0.25,-1.224,-19.388,-0.25,-3.3,-19.388,-0.25,3.826],
// 4 4 -8.125 -0.25 -0.325 -6.073 -0.25 -1.071 -6.566 -0.25 -0.701 -7.249 -0.25 -0.405
  [4,4,-8.125,-0.25,-0.325,-6.073,-0.25,-1.071,-6.566,-0.25,-0.701,-7.249,-0.25,-0.405],
// 4 4 -8.125 -0.25 -0.325 -8.518 -0.25 -0.325 -8.518 -0.25 -3.3 -6.073 -0.25 -1.071
  [4,4,-8.125,-0.25,-0.325,-8.518,-0.25,-0.325,-8.518,-0.25,-3.3,-6.073,-0.25,-1.071],
// 4 4 -12.647 -0.25 -0.161 -12.102 -0.25 -2.097 -10.453 -0.25 -3.3 -10.453 -0.25 3.826
  [4,4,-12.647,-0.25,-0.161,-12.102,-0.25,-2.097,-10.453,-0.25,-3.3,-10.453,-0.25,3.826],
// 4 4 -4.951 -0.25 -3.3 -8.518 -0.25 -3.3 -24.859 -0.25 -3.426 15.898 -0.25 -3.42
  [4,4,-4.951,-0.25,-3.3,-8.518,-0.25,-3.3,-24.859,-0.25,-3.426,15.898,-0.25,-3.42],
// 3 4 -28.249 -0.25 1.178 -28.815 -0.25 -0.844 -27.586 -0.25 0.525
  [3,4,-28.249,-0.25,1.178,-28.815,-0.25,-0.844,-27.586,-0.25,0.525],
// 4 4 -28.469 -0.25 1.959 -37.5 -0.25 9 -28.815 -0.25 -0.844 -28.249 -0.25 1.178
  [4,4,-28.469,-0.25,1.959,-37.5,-0.25,9,-28.815,-0.25,-0.844,-28.249,-0.25,1.178],
// 3 4 -37.5 -0.25 9 -28.469 -0.25 1.959 -28.365 -0.25 2.485
  [3,4,-37.5,-0.25,9,-28.469,-0.25,1.959,-28.365,-0.25,2.485],
// 4 4 -25.7 -0.25 1.39 -24.55 -0.25 1.147 -24.987 -0.25 2.754 -25.739 -0.25 2.69
  [4,4,-25.7,-0.25,1.39,-24.55,-0.25,1.147,-24.987,-0.25,2.754,-25.739,-0.25,2.69],
// 4 4 -24.55 -0.25 1.147 -23.322 -0.25 0.895 -23.229 -0.25 1.726 -23.762 -0.25 2.514
  [4,4,-24.55,-0.25,1.147,-23.322,-0.25,0.895,-23.229,-0.25,1.726,-23.762,-0.25,2.514],
// 4 4 -26.308 -0.25 2.497 -26.615 -0.25 2.055 -26.327 -0.25 1.623 -25.739 -0.25 2.69
  [4,4,-26.308,-0.25,2.497,-26.615,-0.25,2.055,-26.327,-0.25,1.623,-25.739,-0.25,2.69],
// 3 4 -25.739 -0.25 2.69 -26.327 -0.25 1.623 -25.7 -0.25 1.39
  [3,4,-25.739,-0.25,2.69,-26.327,-0.25,1.623,-25.7,-0.25,1.39],
// 4 4 -23.229 -0.25 1.726 -23.322 -0.25 0.895 -22.462 -0.25 0.635 -21.294 -0.25 1.726
  [4,4,-23.229,-0.25,1.726,-23.322,-0.25,0.895,-22.462,-0.25,0.635,-21.294,-0.25,1.726],
// 3 4 -37.5 -0.25 9 -28.365 -0.25 2.485 -28.054 -0.25 2.977
  [3,4,-37.5,-0.25,9,-28.365,-0.25,2.485,-28.054,-0.25,2.977],
// 3 4 -37.5 -0.25 9 -27.547 -0.25 3.394 -26.857 -0.25 3.698
  [3,4,-37.5,-0.25,9,-27.547,-0.25,3.394,-26.857,-0.25,3.698],
// 3 4 -37.5 -0.25 9 -28.054 -0.25 2.977 -27.547 -0.25 3.394
  [3,4,-37.5,-0.25,9,-28.054,-0.25,2.977,-27.547,-0.25,3.394],
// 3 4 -37.5 -0.25 9 -26.857 -0.25 3.698 -25.994 -0.25 3.884
  [3,4,-37.5,-0.25,9,-26.857,-0.25,3.698,-25.994,-0.25,3.884],
// 4 4 -24.97 -0.25 3.946 -23.865 -0.25 3.881 -19.388 -0.25 3.826 -12.286 -0.25 3.826
  [4,4,-24.97,-0.25,3.946,-23.865,-0.25,3.881,-19.388,-0.25,3.826,-12.286,-0.25,3.826],
// 3 4 -37.5 -0.25 9 -25.994 -0.25 3.884 -24.97 -0.25 3.946
  [3,4,-37.5,-0.25,9,-25.994,-0.25,3.884,-24.97,-0.25,3.946],
// 3 4 -24.987 -0.25 2.754 -24.55 -0.25 1.147 -23.762 -0.25 2.514
  [3,4,-24.987,-0.25,2.754,-24.55,-0.25,1.147,-23.762,-0.25,2.514],
// 4 4 -10.453 -0.25 3.826 -37.5 -0.25 9 -24.97 -0.25 3.946 -12.286 -0.25 3.826
  [4,4,-10.453,-0.25,3.826,-37.5,-0.25,9,-24.97,-0.25,3.946,-12.286,-0.25,3.826],
// 3 4 -27.586 -0.25 0.525 -28.815 -0.25 -0.844 -27.064 -0.25 0.262
  [3,4,-27.586,-0.25,0.525,-28.815,-0.25,-0.844,-27.064,-0.25,0.262],
// 3 4 -21.294 -0.25 1.726 -22.462 -0.25 0.635 -21.859 -0.25 0.321
  [3,4,-21.294,-0.25,1.726,-22.462,-0.25,0.635,-21.859,-0.25,0.321],
// 4 4 -21.117 -0.25 -0.603 -19.388 -0.25 3.826 -21.294 -0.25 1.726 -21.404 -0.25 -0.089
  [4,4,-21.117,-0.25,-0.603,-19.388,-0.25,3.826,-21.294,-0.25,1.726,-21.404,-0.25,-0.089],
// 3 4 -21.294 -0.25 1.726 -21.859 -0.25 0.321 -21.404 -0.25 -0.089
  [3,4,-21.294,-0.25,1.726,-21.859,-0.25,0.321,-21.404,-0.25,-0.089],
// 4 4 -8.518 -0.25 2.623 -8.518 -0.25 0.812 -7.887 -0.25 0.812 -7.808 -0.25 2.623
  [4,4,-8.518,-0.25,2.623,-8.518,-0.25,0.812,-7.887,-0.25,0.812,-7.808,-0.25,2.623],
// 4 4 -7.808 -0.25 2.623 -7.887 -0.25 0.812 -6.756 -0.25 0.835 -6.867 -0.25 2.616
  [4,4,-7.808,-0.25,2.623,-7.887,-0.25,0.812,-6.756,-0.25,0.835,-6.867,-0.25,2.616],
// 4 4 -12.647 -0.25 1.042 -12.647 -0.25 -0.161 -10.453 -0.25 3.826 -12.286 -0.25 2.623
  [4,4,-12.647,-0.25,1.042,-12.647,-0.25,-0.161,-10.453,-0.25,3.826,-12.286,-0.25,2.623],
// 4 4 -6.397 -0.25 2.598 -6.756 -0.25 0.835 -6.149 -0.25 0.9 -5.41 -0.25 1.737
  [4,4,-6.397,-0.25,2.598,-6.756,-0.25,0.835,-6.149,-0.25,0.9,-5.41,-0.25,1.737],
// 4 4 -17.452 -0.25 2.623 -17.452 -0.25 1.042 -12.647 -0.25 1.042 -12.286 -0.25 2.623
  [4,4,-17.452,-0.25,2.623,-17.452,-0.25,1.042,-12.647,-0.25,1.042,-12.286,-0.25,2.623],
// 3 4 -6.867 -0.25 2.616 -6.756 -0.25 0.835 -6.397 -0.25 2.598
  [3,4,-6.867,-0.25,2.616,-6.756,-0.25,0.835,-6.397,-0.25,2.598],
// 3 4 -19.388 -0.25 3.826 -21.74 -0.25 2.924 -21.42 -0.25 2.401
  [3,4,-19.388,-0.25,3.826,-21.74,-0.25,2.924,-21.42,-0.25,2.401],
// 3 4 -19.388 -0.25 3.826 -21.42 -0.25 2.401 -21.294 -0.25 1.726
  [3,4,-19.388,-0.25,3.826,-21.42,-0.25,2.401,-21.294,-0.25,1.726],
// 3 4 -19.388 -0.25 3.826 -22.959 -0.25 3.685 -22.252 -0.25 3.359
  [3,4,-19.388,-0.25,3.826,-22.959,-0.25,3.685,-22.252,-0.25,3.359],
// 3 4 -19.388 -0.25 3.826 -22.252 -0.25 3.359 -21.74 -0.25 2.924
  [3,4,-19.388,-0.25,3.826,-22.252,-0.25,3.359,-21.74,-0.25,2.924],
// 3 4 -23.865 -0.25 3.881 -22.959 -0.25 3.685 -19.388 -0.25 3.826
  [3,4,-23.865,-0.25,3.881,-22.959,-0.25,3.685,-19.388,-0.25,3.826],
// 3 4 -10.453 -0.25 3.826 -12.286 -0.25 3.826 -12.286 -0.25 2.623
  [3,4,-10.453,-0.25,3.826,-12.286,-0.25,3.826,-12.286,-0.25,2.623],
// 3 4 -37.5 -0.25 9 -10.453 -0.25 3.826 -7.181 -0.25 3.826
  [3,4,-37.5,-0.25,9,-10.453,-0.25,3.826,-7.181,-0.25,3.826],
// 4 4 -1.762 -0.25 3.826 -37.5 -0.25 9 -7.181 -0.25 3.826 -5.855 -0.25 3.778
  [4,4,-1.762,-0.25,3.826,-37.5,-0.25,9,-7.181,-0.25,3.826,-5.855,-0.25,3.778],
// 3 4 -3.135 -0.25 -3.3 -4.951 -0.25 -3.3 15.898 -0.25 -3.42
  [3,4,-3.135,-0.25,-3.3,-4.951,-0.25,-3.3,15.898,-0.25,-3.42],
// 4 4 -3.406 -0.25 -1.91 -3.135 -0.25 -3.3 1.661 -0.25 -3.3 -3.574 -0.25 1.096
  [4,4,-3.406,-0.25,-1.91,-3.135,-0.25,-3.3,1.661,-0.25,-3.3,-3.574,-0.25,1.096],
// 3 4 3.734 -0.25 -3.3 1.661 -0.25 -3.3 15.898 -0.25 -3.42
  [3,4,3.734,-0.25,-3.3,1.661,-0.25,-3.3,15.898,-0.25,-3.42],
// 3 4 1.661 -0.25 -3.3 -3.135 -0.25 -3.3 15.898 -0.25 -3.42
  [3,4,1.661,-0.25,-3.3,-3.135,-0.25,-3.3,15.898,-0.25,-3.42],
// 4 4 10.021 -0.25 -3.3 11.606 -0.25 -0.597 11.529 -0.25 0.2 10.021 -0.25 3.826
  [4,4,10.021,-0.25,-3.3,11.606,-0.25,-0.597,11.529,-0.25,0.2,10.021,-0.25,3.826],
// 4 4 10.021 -0.25 -3.3 8.085 -0.25 -3.3 15.898 -0.25 -3.42 14.986 -0.25 -3.36
  [4,4,10.021,-0.25,-3.3,8.085,-0.25,-3.3,15.898,-0.25,-3.42,14.986,-0.25,-3.36],
// 3 4 14.158 -0.25 -3.178 10.021 -0.25 -3.3 14.986 -0.25 -3.36
  [3,4,14.158,-0.25,-3.178,10.021,-0.25,-3.3,14.986,-0.25,-3.36],
// 3 4 13.416 -0.25 -2.875 10.021 -0.25 -3.3 14.158 -0.25 -3.178
  [3,4,13.416,-0.25,-2.875,10.021,-0.25,-3.3,14.158,-0.25,-3.178],
// 3 4 12.221 -0.25 -1.922 10.021 -0.25 -3.3 12.759 -0.25 -2.451
  [3,4,12.221,-0.25,-1.922,10.021,-0.25,-3.3,12.759,-0.25,-2.451],
// 3 4 12.759 -0.25 -2.451 10.021 -0.25 -3.3 13.416 -0.25 -2.875
  [3,4,12.759,-0.25,-2.451,10.021,-0.25,-3.3,13.416,-0.25,-2.875],
// 4 4 7.165 -0.25 3.826 3.734 -0.25 -3.3 8.085 -0.25 -3.3 8.085 -0.25 3.826
  [4,4,7.165,-0.25,3.826,3.734,-0.25,-3.3,8.085,-0.25,-3.3,8.085,-0.25,3.826],
// 3 4 8.085 -0.25 -3.3 3.734 -0.25 -3.3 15.898 -0.25 -3.42
  [3,4,8.085,-0.25,-3.3,3.734,-0.25,-3.3,15.898,-0.25,-3.42],
// 3 4 11.836 -0.25 -1.304 10.021 -0.25 -3.3 12.221 -0.25 -1.922
  [3,4,11.836,-0.25,-1.304,10.021,-0.25,-3.3,12.221,-0.25,-1.922],
// 4 4 -4.048 -0.25 0.504 -3.727 -0.25 -1.205 -3.406 -0.25 -1.91 -3.574 -0.25 1.096
  [4,4,-4.048,-0.25,0.504,-3.727,-0.25,-1.205,-3.406,-0.25,-1.91,-3.574,-0.25,1.096],
// 4 4 -4.048 -0.25 0.504 -4.638 -0.25 0.078 -4.206 -0.25 -0.653 -3.727 -0.25 -1.205
  [4,4,-4.048,-0.25,0.504,-4.638,-0.25,0.078,-4.206,-0.25,-0.653,-3.727,-0.25,-1.205],
// 4 4 18.006 -0.25 -0.675 13.523 -0.25 0.307 13.596 -0.25 -0.507 13.814 -0.25 -1.148
  [4,4,18.006,-0.25,-0.675,13.523,-0.25,0.307,13.596,-0.25,-0.507,13.814,-0.25,-1.148],
// 3 4 10.021 -0.25 3.826 11.529 -0.25 0.2 11.606 -0.25 1.039
  [3,4,10.021,-0.25,3.826,11.529,-0.25,0.2,11.606,-0.25,1.039],
// 3 4 11.606 -0.25 -0.597 10.021 -0.25 -3.3 11.836 -0.25 -1.304
  [3,4,11.606,-0.25,-0.597,10.021,-0.25,-3.3,11.836,-0.25,-1.304],
// 3 4 -4.638 -0.25 0.078 -5.04 -0.25 -0.155 -4.206 -0.25 -0.653
  [3,4,-4.638,-0.25,0.078,-5.04,-0.25,-0.155,-4.206,-0.25,-0.653],
// 4 4 15.879 -0.25 -2.19 16.597 -0.25 -2.098 17.207 -0.25 -1.824 17.785 -0.25 -1.255
  [4,4,15.879,-0.25,-2.19,16.597,-0.25,-2.098,17.207,-0.25,-1.824,17.785,-0.25,-1.255],
// 4 4 21.545 -0.25 -3.3 16.868 -0.25 -3.357 15.898 -0.25 -3.42 28.831 -0.25 -3.3
  [4,4,21.545,-0.25,-3.3,16.868,-0.25,-3.357,15.898,-0.25,-3.42,28.831,-0.25,-3.3],
// 3 4 28.831 -0.25 -3.3 15.898 -0.25 -3.42 37.5 -0.25 -9
  [3,4,28.831,-0.25,-3.3,15.898,-0.25,-3.42,37.5,-0.25,-9],
// 3 4 19.631 -0.25 -1.63 19.052 -0.25 -2.408 21.545 -0.25 -3.3
  [3,4,19.631,-0.25,-1.63,19.052,-0.25,-2.408,21.545,-0.25,-3.3],
// 3 4 18.446 -0.25 -2.853 17.717 -0.25 -3.168 21.545 -0.25 -3.3
  [3,4,18.446,-0.25,-2.853,17.717,-0.25,-3.168,21.545,-0.25,-3.3],
// 3 4 19.052 -0.25 -2.408 18.446 -0.25 -2.853 21.545 -0.25 -3.3
  [3,4,19.052,-0.25,-2.408,18.446,-0.25,-2.853,21.545,-0.25,-3.3],
// 3 4 17.717 -0.25 -3.168 16.868 -0.25 -3.357 21.545 -0.25 -3.3
  [3,4,17.717,-0.25,-3.168,16.868,-0.25,-3.357,21.545,-0.25,-3.3],
// 3 4 28.831 -0.25 -2.097 28.831 -0.25 -3.3 37.5 -0.25 -9
  [3,4,28.831,-0.25,-2.097,28.831,-0.25,-3.3,37.5,-0.25,-9],
// 4 4 14.93 -0.25 -2.047 15.879 -0.25 -2.19 17.785 -0.25 -1.255 14.178 -0.25 -1.617
  [4,4,14.93,-0.25,-2.047,15.879,-0.25,-2.19,17.785,-0.25,-1.255,14.178,-0.25,-1.617],
// 4 4 17.785 -0.25 -1.255 18.006 -0.25 -0.675 13.814 -0.25 -1.148 14.178 -0.25 -1.617
  [4,4,17.785,-0.25,-1.255,18.006,-0.25,-0.675,13.814,-0.25,-1.148,14.178,-0.25,-1.617],
// 4 4 19.882 -0.25 -0.675 19.631 -0.25 -1.63 21.545 -0.25 -3.3 21.545 -0.25 3.826
  [4,4,19.882,-0.25,-0.675,19.631,-0.25,-1.63,21.545,-0.25,-3.3,21.545,-0.25,3.826],
// 4 4 23.481 -0.25 -2.097 28.831 -0.25 -2.097 28.287 -0.25 -0.161 23.481 -0.25 -0.161
  [4,4,23.481,-0.25,-2.097,28.831,-0.25,-2.097,28.287,-0.25,-0.161,23.481,-0.25,-0.161],
// 3 4 21.545 -0.25 3.826 19.853 -0.25 1.518 19.882 -0.25 -0.675
  [3,4,21.545,-0.25,3.826,19.853,-0.25,1.518,19.882,-0.25,-0.675],
// 4 4 18.006 -0.25 -0.675 19.882 -0.25 -0.675 19.853 -0.25 1.518 17.939 -0.25 1.518
  [4,4,18.006,-0.25,-0.675,19.882,-0.25,-0.675,19.853,-0.25,1.518,17.939,-0.25,1.518],
// 4 4 28.287 -0.25 -0.161 28.831 -0.25 -2.097 37.5 -0.25 -9 37.5 -0.25 9
  [4,4,28.287,-0.25,-0.161,28.831,-0.25,-2.097,37.5,-0.25,-9,37.5,-0.25,9],
// 4 4 13.523 -0.25 0.307 18.006 -0.25 -0.675 17.939 -0.25 1.518 13.597 -0.25 1.077
  [4,4,13.523,-0.25,0.307,18.006,-0.25,-0.675,17.939,-0.25,1.518,13.597,-0.25,1.077],
// 3 4 -6.397 -0.25 2.598 -5.41 -0.25 1.737 -5.668 -0.25 2.319
  [3,4,-6.397,-0.25,2.598,-5.41,-0.25,1.737,-5.668,-0.25,2.319],
// 3 4 5.109 -0.25 3.826 0.337 -0.25 3.826 2.76 -0.25 -1.446
  [3,4,5.109,-0.25,3.826,0.337,-0.25,3.826,2.76,-0.25,-1.446],
// 4 4 1.661 -0.25 -3.3 -1.762 -0.25 3.826 -3.416 -0.25 1.828 -3.574 -0.25 1.096
  [4,4,1.661,-0.25,-3.3,-1.762,-0.25,3.826,-3.416,-0.25,1.828,-3.574,-0.25,1.096],
// 3 4 10.021 -0.25 3.826 11.606 -0.25 1.039 11.838 -0.25 1.78
  [3,4,10.021,-0.25,3.826,11.606,-0.25,1.039,11.838,-0.25,1.78],
// 3 4 -1.762 -0.25 3.826 -3.834 -0.25 2.951 -3.52 -0.25 2.425
  [3,4,-1.762,-0.25,3.826,-3.834,-0.25,2.951,-3.52,-0.25,2.425],
// 3 4 10.021 -0.25 3.826 11.838 -0.25 1.78 12.224 -0.25 2.42
  [3,4,10.021,-0.25,3.826,11.838,-0.25,1.78,12.224,-0.25,2.42],
// 3 4 -1.762 -0.25 3.826 -4.948 -0.25 3.634 -4.322 -0.25 3.367
  [3,4,-1.762,-0.25,3.826,-4.948,-0.25,3.634,-4.322,-0.25,3.367],
// 3 4 -1.762 -0.25 3.826 -5.855 -0.25 3.778 -4.948 -0.25 3.634
  [3,4,-1.762,-0.25,3.826,-5.855,-0.25,3.778,-4.948,-0.25,3.634],
// 3 4 -1.762 -0.25 3.826 -4.322 -0.25 3.367 -3.834 -0.25 2.951
  [3,4,-1.762,-0.25,3.826,-4.322,-0.25,3.367,-3.834,-0.25,2.951],
// 4 4 -1.762 -0.25 3.826 0.337 -0.25 3.826 16.015 -0.25 3.946 -37.5 -0.25 9
  [4,4,-1.762,-0.25,3.826,0.337,-0.25,3.826,16.015,-0.25,3.946,-37.5,-0.25,9],
// 3 4 -1.762 -0.25 3.826 -3.52 -0.25 2.425 -3.416 -0.25 1.828
  [3,4,-1.762,-0.25,3.826,-3.52,-0.25,2.425,-3.416,-0.25,1.828],
// 3 4 10.021 -0.25 3.826 12.765 -0.25 2.962 13.431 -0.25 3.393
  [3,4,10.021,-0.25,3.826,12.765,-0.25,2.962,13.431,-0.25,3.393],
// 3 4 16.015 -0.25 3.946 7.165 -0.25 3.826 8.085 -0.25 3.826
  [3,4,16.015,-0.25,3.946,7.165,-0.25,3.826,8.085,-0.25,3.826],
// 4 4 16.015 -0.25 3.946 8.085 -0.25 3.826 10.021 -0.25 3.826 15.056 -0.25 3.884
  [4,4,16.015,-0.25,3.946,8.085,-0.25,3.826,10.021,-0.25,3.826,15.056,-0.25,3.884],
// 3 4 10.021 -0.25 3.826 13.431 -0.25 3.393 14.195 -0.25 3.7
  [3,4,10.021,-0.25,3.826,13.431,-0.25,3.393,14.195,-0.25,3.7],
// 3 4 16.015 -0.25 3.946 5.109 -0.25 3.826 7.165 -0.25 3.826
  [3,4,16.015,-0.25,3.946,5.109,-0.25,3.826,7.165,-0.25,3.826],
// 3 4 10.021 -0.25 3.826 12.224 -0.25 2.42 12.765 -0.25 2.962
  [3,4,10.021,-0.25,3.826,12.224,-0.25,2.42,12.765,-0.25,2.962],
// 3 4 16.015 -0.25 3.946 0.337 -0.25 3.826 5.109 -0.25 3.826
  [3,4,16.015,-0.25,3.946,0.337,-0.25,3.826,5.109,-0.25,3.826],
// 3 4 -5.41 -0.25 1.737 -6.149 -0.25 0.9 -5.606 -0.25 1.202
  [3,4,-5.41,-0.25,1.737,-6.149,-0.25,0.9,-5.606,-0.25,1.202],
// 4 4 17.939 -0.25 1.518 15.918 -0.25 2.716 14.952 -0.25 2.574 14.188 -0.25 2.147
  [4,4,17.939,-0.25,1.518,15.918,-0.25,2.716,14.952,-0.25,2.574,14.188,-0.25,2.147],
// 4 4 17.939 -0.25 1.518 14.188 -0.25 2.147 13.819 -0.25 1.69 13.597 -0.25 1.077
  [4,4,17.939,-0.25,1.518,14.188,-0.25,2.147,13.819,-0.25,1.69,13.597,-0.25,1.077],
// 4 4 15.918 -0.25 2.716 17.939 -0.25 1.518 17.677 -0.25 2.014 16.632 -0.25 2.635
  [4,4,15.918,-0.25,2.716,17.939,-0.25,1.518,17.677,-0.25,2.014,16.632,-0.25,2.635],
// 3 4 16.632 -0.25 2.635 17.677 -0.25 2.014 17.229 -0.25 2.394
  [3,4,16.632,-0.25,2.635,17.677,-0.25,2.014,17.229,-0.25,2.394],
// 4 4 23.481 -0.25 2.623 23.481 -0.25 1.042 28.287 -0.25 1.042 28.647 -0.25 2.623
  [4,4,23.481,-0.25,2.623,23.481,-0.25,1.042,28.287,-0.25,1.042,28.647,-0.25,2.623],
// 3 4 21.545 -0.25 3.826 19.544 -0.25 2.414 19.853 -0.25 1.518
  [3,4,21.545,-0.25,3.826,19.544,-0.25,2.414,19.853,-0.25,1.518],
// 4 4 16.015 -0.25 3.946 17.113 -0.25 3.86 21.545 -0.25 3.826 37.5 -0.25 9
  [4,4,16.015,-0.25,3.946,17.113,-0.25,3.86,21.545,-0.25,3.826,37.5,-0.25,9],
// 3 4 15.056 -0.25 3.884 10.021 -0.25 3.826 14.195 -0.25 3.7
  [3,4,15.056,-0.25,3.884,10.021,-0.25,3.826,14.195,-0.25,3.7],
// 3 4 21.545 -0.25 3.826 18.066 -0.25 3.602 18.872 -0.25 3.172
  [3,4,21.545,-0.25,3.826,18.066,-0.25,3.602,18.872,-0.25,3.172],
// 3 4 21.545 -0.25 3.826 18.872 -0.25 3.172 19.544 -0.25 2.414
  [3,4,21.545,-0.25,3.826,18.872,-0.25,3.172,19.544,-0.25,2.414],
// 3 4 37.5 -0.25 9 21.545 -0.25 3.826 28.647 -0.25 3.826
  [3,4,37.5,-0.25,9,21.545,-0.25,3.826,28.647,-0.25,3.826],
// 3 4 37.5 -0.25 9 28.647 -0.25 3.826 28.647 -0.25 2.623
  [3,4,37.5,-0.25,9,28.647,-0.25,3.826,28.647,-0.25,2.623],
// 4 4 37.5 -0.25 9 28.647 -0.25 2.623 28.287 -0.25 1.042 28.287 -0.25 -0.161
  [4,4,37.5,-0.25,9,28.647,-0.25,2.623,28.287,-0.25,1.042,28.287,-0.25,-0.161],
// 3 4 17.113 -0.25 3.86 18.066 -0.25 3.602 21.545 -0.25 3.826
  [3,4,17.113,-0.25,3.86,18.066,-0.25,3.602,21.545,-0.25,3.826],
// 3 4 37.5 -0.25 9 -37.5 -0.25 9 16.015 -0.25 3.946
  [3,4,37.5,-0.25,9,-37.5,-0.25,9,16.015,-0.25,3.946],
];
module ldraw_lib__190435b(step=0, col=false, unit=2/5, alt=false, line=0.2, solid=!$preview)
    makepoly(ldraw_lib__190435b(), step=step, col=col, unit=unit, alt=alt, line=line, solid=solid);
ldraw_lib__190435b(line=0.2);
